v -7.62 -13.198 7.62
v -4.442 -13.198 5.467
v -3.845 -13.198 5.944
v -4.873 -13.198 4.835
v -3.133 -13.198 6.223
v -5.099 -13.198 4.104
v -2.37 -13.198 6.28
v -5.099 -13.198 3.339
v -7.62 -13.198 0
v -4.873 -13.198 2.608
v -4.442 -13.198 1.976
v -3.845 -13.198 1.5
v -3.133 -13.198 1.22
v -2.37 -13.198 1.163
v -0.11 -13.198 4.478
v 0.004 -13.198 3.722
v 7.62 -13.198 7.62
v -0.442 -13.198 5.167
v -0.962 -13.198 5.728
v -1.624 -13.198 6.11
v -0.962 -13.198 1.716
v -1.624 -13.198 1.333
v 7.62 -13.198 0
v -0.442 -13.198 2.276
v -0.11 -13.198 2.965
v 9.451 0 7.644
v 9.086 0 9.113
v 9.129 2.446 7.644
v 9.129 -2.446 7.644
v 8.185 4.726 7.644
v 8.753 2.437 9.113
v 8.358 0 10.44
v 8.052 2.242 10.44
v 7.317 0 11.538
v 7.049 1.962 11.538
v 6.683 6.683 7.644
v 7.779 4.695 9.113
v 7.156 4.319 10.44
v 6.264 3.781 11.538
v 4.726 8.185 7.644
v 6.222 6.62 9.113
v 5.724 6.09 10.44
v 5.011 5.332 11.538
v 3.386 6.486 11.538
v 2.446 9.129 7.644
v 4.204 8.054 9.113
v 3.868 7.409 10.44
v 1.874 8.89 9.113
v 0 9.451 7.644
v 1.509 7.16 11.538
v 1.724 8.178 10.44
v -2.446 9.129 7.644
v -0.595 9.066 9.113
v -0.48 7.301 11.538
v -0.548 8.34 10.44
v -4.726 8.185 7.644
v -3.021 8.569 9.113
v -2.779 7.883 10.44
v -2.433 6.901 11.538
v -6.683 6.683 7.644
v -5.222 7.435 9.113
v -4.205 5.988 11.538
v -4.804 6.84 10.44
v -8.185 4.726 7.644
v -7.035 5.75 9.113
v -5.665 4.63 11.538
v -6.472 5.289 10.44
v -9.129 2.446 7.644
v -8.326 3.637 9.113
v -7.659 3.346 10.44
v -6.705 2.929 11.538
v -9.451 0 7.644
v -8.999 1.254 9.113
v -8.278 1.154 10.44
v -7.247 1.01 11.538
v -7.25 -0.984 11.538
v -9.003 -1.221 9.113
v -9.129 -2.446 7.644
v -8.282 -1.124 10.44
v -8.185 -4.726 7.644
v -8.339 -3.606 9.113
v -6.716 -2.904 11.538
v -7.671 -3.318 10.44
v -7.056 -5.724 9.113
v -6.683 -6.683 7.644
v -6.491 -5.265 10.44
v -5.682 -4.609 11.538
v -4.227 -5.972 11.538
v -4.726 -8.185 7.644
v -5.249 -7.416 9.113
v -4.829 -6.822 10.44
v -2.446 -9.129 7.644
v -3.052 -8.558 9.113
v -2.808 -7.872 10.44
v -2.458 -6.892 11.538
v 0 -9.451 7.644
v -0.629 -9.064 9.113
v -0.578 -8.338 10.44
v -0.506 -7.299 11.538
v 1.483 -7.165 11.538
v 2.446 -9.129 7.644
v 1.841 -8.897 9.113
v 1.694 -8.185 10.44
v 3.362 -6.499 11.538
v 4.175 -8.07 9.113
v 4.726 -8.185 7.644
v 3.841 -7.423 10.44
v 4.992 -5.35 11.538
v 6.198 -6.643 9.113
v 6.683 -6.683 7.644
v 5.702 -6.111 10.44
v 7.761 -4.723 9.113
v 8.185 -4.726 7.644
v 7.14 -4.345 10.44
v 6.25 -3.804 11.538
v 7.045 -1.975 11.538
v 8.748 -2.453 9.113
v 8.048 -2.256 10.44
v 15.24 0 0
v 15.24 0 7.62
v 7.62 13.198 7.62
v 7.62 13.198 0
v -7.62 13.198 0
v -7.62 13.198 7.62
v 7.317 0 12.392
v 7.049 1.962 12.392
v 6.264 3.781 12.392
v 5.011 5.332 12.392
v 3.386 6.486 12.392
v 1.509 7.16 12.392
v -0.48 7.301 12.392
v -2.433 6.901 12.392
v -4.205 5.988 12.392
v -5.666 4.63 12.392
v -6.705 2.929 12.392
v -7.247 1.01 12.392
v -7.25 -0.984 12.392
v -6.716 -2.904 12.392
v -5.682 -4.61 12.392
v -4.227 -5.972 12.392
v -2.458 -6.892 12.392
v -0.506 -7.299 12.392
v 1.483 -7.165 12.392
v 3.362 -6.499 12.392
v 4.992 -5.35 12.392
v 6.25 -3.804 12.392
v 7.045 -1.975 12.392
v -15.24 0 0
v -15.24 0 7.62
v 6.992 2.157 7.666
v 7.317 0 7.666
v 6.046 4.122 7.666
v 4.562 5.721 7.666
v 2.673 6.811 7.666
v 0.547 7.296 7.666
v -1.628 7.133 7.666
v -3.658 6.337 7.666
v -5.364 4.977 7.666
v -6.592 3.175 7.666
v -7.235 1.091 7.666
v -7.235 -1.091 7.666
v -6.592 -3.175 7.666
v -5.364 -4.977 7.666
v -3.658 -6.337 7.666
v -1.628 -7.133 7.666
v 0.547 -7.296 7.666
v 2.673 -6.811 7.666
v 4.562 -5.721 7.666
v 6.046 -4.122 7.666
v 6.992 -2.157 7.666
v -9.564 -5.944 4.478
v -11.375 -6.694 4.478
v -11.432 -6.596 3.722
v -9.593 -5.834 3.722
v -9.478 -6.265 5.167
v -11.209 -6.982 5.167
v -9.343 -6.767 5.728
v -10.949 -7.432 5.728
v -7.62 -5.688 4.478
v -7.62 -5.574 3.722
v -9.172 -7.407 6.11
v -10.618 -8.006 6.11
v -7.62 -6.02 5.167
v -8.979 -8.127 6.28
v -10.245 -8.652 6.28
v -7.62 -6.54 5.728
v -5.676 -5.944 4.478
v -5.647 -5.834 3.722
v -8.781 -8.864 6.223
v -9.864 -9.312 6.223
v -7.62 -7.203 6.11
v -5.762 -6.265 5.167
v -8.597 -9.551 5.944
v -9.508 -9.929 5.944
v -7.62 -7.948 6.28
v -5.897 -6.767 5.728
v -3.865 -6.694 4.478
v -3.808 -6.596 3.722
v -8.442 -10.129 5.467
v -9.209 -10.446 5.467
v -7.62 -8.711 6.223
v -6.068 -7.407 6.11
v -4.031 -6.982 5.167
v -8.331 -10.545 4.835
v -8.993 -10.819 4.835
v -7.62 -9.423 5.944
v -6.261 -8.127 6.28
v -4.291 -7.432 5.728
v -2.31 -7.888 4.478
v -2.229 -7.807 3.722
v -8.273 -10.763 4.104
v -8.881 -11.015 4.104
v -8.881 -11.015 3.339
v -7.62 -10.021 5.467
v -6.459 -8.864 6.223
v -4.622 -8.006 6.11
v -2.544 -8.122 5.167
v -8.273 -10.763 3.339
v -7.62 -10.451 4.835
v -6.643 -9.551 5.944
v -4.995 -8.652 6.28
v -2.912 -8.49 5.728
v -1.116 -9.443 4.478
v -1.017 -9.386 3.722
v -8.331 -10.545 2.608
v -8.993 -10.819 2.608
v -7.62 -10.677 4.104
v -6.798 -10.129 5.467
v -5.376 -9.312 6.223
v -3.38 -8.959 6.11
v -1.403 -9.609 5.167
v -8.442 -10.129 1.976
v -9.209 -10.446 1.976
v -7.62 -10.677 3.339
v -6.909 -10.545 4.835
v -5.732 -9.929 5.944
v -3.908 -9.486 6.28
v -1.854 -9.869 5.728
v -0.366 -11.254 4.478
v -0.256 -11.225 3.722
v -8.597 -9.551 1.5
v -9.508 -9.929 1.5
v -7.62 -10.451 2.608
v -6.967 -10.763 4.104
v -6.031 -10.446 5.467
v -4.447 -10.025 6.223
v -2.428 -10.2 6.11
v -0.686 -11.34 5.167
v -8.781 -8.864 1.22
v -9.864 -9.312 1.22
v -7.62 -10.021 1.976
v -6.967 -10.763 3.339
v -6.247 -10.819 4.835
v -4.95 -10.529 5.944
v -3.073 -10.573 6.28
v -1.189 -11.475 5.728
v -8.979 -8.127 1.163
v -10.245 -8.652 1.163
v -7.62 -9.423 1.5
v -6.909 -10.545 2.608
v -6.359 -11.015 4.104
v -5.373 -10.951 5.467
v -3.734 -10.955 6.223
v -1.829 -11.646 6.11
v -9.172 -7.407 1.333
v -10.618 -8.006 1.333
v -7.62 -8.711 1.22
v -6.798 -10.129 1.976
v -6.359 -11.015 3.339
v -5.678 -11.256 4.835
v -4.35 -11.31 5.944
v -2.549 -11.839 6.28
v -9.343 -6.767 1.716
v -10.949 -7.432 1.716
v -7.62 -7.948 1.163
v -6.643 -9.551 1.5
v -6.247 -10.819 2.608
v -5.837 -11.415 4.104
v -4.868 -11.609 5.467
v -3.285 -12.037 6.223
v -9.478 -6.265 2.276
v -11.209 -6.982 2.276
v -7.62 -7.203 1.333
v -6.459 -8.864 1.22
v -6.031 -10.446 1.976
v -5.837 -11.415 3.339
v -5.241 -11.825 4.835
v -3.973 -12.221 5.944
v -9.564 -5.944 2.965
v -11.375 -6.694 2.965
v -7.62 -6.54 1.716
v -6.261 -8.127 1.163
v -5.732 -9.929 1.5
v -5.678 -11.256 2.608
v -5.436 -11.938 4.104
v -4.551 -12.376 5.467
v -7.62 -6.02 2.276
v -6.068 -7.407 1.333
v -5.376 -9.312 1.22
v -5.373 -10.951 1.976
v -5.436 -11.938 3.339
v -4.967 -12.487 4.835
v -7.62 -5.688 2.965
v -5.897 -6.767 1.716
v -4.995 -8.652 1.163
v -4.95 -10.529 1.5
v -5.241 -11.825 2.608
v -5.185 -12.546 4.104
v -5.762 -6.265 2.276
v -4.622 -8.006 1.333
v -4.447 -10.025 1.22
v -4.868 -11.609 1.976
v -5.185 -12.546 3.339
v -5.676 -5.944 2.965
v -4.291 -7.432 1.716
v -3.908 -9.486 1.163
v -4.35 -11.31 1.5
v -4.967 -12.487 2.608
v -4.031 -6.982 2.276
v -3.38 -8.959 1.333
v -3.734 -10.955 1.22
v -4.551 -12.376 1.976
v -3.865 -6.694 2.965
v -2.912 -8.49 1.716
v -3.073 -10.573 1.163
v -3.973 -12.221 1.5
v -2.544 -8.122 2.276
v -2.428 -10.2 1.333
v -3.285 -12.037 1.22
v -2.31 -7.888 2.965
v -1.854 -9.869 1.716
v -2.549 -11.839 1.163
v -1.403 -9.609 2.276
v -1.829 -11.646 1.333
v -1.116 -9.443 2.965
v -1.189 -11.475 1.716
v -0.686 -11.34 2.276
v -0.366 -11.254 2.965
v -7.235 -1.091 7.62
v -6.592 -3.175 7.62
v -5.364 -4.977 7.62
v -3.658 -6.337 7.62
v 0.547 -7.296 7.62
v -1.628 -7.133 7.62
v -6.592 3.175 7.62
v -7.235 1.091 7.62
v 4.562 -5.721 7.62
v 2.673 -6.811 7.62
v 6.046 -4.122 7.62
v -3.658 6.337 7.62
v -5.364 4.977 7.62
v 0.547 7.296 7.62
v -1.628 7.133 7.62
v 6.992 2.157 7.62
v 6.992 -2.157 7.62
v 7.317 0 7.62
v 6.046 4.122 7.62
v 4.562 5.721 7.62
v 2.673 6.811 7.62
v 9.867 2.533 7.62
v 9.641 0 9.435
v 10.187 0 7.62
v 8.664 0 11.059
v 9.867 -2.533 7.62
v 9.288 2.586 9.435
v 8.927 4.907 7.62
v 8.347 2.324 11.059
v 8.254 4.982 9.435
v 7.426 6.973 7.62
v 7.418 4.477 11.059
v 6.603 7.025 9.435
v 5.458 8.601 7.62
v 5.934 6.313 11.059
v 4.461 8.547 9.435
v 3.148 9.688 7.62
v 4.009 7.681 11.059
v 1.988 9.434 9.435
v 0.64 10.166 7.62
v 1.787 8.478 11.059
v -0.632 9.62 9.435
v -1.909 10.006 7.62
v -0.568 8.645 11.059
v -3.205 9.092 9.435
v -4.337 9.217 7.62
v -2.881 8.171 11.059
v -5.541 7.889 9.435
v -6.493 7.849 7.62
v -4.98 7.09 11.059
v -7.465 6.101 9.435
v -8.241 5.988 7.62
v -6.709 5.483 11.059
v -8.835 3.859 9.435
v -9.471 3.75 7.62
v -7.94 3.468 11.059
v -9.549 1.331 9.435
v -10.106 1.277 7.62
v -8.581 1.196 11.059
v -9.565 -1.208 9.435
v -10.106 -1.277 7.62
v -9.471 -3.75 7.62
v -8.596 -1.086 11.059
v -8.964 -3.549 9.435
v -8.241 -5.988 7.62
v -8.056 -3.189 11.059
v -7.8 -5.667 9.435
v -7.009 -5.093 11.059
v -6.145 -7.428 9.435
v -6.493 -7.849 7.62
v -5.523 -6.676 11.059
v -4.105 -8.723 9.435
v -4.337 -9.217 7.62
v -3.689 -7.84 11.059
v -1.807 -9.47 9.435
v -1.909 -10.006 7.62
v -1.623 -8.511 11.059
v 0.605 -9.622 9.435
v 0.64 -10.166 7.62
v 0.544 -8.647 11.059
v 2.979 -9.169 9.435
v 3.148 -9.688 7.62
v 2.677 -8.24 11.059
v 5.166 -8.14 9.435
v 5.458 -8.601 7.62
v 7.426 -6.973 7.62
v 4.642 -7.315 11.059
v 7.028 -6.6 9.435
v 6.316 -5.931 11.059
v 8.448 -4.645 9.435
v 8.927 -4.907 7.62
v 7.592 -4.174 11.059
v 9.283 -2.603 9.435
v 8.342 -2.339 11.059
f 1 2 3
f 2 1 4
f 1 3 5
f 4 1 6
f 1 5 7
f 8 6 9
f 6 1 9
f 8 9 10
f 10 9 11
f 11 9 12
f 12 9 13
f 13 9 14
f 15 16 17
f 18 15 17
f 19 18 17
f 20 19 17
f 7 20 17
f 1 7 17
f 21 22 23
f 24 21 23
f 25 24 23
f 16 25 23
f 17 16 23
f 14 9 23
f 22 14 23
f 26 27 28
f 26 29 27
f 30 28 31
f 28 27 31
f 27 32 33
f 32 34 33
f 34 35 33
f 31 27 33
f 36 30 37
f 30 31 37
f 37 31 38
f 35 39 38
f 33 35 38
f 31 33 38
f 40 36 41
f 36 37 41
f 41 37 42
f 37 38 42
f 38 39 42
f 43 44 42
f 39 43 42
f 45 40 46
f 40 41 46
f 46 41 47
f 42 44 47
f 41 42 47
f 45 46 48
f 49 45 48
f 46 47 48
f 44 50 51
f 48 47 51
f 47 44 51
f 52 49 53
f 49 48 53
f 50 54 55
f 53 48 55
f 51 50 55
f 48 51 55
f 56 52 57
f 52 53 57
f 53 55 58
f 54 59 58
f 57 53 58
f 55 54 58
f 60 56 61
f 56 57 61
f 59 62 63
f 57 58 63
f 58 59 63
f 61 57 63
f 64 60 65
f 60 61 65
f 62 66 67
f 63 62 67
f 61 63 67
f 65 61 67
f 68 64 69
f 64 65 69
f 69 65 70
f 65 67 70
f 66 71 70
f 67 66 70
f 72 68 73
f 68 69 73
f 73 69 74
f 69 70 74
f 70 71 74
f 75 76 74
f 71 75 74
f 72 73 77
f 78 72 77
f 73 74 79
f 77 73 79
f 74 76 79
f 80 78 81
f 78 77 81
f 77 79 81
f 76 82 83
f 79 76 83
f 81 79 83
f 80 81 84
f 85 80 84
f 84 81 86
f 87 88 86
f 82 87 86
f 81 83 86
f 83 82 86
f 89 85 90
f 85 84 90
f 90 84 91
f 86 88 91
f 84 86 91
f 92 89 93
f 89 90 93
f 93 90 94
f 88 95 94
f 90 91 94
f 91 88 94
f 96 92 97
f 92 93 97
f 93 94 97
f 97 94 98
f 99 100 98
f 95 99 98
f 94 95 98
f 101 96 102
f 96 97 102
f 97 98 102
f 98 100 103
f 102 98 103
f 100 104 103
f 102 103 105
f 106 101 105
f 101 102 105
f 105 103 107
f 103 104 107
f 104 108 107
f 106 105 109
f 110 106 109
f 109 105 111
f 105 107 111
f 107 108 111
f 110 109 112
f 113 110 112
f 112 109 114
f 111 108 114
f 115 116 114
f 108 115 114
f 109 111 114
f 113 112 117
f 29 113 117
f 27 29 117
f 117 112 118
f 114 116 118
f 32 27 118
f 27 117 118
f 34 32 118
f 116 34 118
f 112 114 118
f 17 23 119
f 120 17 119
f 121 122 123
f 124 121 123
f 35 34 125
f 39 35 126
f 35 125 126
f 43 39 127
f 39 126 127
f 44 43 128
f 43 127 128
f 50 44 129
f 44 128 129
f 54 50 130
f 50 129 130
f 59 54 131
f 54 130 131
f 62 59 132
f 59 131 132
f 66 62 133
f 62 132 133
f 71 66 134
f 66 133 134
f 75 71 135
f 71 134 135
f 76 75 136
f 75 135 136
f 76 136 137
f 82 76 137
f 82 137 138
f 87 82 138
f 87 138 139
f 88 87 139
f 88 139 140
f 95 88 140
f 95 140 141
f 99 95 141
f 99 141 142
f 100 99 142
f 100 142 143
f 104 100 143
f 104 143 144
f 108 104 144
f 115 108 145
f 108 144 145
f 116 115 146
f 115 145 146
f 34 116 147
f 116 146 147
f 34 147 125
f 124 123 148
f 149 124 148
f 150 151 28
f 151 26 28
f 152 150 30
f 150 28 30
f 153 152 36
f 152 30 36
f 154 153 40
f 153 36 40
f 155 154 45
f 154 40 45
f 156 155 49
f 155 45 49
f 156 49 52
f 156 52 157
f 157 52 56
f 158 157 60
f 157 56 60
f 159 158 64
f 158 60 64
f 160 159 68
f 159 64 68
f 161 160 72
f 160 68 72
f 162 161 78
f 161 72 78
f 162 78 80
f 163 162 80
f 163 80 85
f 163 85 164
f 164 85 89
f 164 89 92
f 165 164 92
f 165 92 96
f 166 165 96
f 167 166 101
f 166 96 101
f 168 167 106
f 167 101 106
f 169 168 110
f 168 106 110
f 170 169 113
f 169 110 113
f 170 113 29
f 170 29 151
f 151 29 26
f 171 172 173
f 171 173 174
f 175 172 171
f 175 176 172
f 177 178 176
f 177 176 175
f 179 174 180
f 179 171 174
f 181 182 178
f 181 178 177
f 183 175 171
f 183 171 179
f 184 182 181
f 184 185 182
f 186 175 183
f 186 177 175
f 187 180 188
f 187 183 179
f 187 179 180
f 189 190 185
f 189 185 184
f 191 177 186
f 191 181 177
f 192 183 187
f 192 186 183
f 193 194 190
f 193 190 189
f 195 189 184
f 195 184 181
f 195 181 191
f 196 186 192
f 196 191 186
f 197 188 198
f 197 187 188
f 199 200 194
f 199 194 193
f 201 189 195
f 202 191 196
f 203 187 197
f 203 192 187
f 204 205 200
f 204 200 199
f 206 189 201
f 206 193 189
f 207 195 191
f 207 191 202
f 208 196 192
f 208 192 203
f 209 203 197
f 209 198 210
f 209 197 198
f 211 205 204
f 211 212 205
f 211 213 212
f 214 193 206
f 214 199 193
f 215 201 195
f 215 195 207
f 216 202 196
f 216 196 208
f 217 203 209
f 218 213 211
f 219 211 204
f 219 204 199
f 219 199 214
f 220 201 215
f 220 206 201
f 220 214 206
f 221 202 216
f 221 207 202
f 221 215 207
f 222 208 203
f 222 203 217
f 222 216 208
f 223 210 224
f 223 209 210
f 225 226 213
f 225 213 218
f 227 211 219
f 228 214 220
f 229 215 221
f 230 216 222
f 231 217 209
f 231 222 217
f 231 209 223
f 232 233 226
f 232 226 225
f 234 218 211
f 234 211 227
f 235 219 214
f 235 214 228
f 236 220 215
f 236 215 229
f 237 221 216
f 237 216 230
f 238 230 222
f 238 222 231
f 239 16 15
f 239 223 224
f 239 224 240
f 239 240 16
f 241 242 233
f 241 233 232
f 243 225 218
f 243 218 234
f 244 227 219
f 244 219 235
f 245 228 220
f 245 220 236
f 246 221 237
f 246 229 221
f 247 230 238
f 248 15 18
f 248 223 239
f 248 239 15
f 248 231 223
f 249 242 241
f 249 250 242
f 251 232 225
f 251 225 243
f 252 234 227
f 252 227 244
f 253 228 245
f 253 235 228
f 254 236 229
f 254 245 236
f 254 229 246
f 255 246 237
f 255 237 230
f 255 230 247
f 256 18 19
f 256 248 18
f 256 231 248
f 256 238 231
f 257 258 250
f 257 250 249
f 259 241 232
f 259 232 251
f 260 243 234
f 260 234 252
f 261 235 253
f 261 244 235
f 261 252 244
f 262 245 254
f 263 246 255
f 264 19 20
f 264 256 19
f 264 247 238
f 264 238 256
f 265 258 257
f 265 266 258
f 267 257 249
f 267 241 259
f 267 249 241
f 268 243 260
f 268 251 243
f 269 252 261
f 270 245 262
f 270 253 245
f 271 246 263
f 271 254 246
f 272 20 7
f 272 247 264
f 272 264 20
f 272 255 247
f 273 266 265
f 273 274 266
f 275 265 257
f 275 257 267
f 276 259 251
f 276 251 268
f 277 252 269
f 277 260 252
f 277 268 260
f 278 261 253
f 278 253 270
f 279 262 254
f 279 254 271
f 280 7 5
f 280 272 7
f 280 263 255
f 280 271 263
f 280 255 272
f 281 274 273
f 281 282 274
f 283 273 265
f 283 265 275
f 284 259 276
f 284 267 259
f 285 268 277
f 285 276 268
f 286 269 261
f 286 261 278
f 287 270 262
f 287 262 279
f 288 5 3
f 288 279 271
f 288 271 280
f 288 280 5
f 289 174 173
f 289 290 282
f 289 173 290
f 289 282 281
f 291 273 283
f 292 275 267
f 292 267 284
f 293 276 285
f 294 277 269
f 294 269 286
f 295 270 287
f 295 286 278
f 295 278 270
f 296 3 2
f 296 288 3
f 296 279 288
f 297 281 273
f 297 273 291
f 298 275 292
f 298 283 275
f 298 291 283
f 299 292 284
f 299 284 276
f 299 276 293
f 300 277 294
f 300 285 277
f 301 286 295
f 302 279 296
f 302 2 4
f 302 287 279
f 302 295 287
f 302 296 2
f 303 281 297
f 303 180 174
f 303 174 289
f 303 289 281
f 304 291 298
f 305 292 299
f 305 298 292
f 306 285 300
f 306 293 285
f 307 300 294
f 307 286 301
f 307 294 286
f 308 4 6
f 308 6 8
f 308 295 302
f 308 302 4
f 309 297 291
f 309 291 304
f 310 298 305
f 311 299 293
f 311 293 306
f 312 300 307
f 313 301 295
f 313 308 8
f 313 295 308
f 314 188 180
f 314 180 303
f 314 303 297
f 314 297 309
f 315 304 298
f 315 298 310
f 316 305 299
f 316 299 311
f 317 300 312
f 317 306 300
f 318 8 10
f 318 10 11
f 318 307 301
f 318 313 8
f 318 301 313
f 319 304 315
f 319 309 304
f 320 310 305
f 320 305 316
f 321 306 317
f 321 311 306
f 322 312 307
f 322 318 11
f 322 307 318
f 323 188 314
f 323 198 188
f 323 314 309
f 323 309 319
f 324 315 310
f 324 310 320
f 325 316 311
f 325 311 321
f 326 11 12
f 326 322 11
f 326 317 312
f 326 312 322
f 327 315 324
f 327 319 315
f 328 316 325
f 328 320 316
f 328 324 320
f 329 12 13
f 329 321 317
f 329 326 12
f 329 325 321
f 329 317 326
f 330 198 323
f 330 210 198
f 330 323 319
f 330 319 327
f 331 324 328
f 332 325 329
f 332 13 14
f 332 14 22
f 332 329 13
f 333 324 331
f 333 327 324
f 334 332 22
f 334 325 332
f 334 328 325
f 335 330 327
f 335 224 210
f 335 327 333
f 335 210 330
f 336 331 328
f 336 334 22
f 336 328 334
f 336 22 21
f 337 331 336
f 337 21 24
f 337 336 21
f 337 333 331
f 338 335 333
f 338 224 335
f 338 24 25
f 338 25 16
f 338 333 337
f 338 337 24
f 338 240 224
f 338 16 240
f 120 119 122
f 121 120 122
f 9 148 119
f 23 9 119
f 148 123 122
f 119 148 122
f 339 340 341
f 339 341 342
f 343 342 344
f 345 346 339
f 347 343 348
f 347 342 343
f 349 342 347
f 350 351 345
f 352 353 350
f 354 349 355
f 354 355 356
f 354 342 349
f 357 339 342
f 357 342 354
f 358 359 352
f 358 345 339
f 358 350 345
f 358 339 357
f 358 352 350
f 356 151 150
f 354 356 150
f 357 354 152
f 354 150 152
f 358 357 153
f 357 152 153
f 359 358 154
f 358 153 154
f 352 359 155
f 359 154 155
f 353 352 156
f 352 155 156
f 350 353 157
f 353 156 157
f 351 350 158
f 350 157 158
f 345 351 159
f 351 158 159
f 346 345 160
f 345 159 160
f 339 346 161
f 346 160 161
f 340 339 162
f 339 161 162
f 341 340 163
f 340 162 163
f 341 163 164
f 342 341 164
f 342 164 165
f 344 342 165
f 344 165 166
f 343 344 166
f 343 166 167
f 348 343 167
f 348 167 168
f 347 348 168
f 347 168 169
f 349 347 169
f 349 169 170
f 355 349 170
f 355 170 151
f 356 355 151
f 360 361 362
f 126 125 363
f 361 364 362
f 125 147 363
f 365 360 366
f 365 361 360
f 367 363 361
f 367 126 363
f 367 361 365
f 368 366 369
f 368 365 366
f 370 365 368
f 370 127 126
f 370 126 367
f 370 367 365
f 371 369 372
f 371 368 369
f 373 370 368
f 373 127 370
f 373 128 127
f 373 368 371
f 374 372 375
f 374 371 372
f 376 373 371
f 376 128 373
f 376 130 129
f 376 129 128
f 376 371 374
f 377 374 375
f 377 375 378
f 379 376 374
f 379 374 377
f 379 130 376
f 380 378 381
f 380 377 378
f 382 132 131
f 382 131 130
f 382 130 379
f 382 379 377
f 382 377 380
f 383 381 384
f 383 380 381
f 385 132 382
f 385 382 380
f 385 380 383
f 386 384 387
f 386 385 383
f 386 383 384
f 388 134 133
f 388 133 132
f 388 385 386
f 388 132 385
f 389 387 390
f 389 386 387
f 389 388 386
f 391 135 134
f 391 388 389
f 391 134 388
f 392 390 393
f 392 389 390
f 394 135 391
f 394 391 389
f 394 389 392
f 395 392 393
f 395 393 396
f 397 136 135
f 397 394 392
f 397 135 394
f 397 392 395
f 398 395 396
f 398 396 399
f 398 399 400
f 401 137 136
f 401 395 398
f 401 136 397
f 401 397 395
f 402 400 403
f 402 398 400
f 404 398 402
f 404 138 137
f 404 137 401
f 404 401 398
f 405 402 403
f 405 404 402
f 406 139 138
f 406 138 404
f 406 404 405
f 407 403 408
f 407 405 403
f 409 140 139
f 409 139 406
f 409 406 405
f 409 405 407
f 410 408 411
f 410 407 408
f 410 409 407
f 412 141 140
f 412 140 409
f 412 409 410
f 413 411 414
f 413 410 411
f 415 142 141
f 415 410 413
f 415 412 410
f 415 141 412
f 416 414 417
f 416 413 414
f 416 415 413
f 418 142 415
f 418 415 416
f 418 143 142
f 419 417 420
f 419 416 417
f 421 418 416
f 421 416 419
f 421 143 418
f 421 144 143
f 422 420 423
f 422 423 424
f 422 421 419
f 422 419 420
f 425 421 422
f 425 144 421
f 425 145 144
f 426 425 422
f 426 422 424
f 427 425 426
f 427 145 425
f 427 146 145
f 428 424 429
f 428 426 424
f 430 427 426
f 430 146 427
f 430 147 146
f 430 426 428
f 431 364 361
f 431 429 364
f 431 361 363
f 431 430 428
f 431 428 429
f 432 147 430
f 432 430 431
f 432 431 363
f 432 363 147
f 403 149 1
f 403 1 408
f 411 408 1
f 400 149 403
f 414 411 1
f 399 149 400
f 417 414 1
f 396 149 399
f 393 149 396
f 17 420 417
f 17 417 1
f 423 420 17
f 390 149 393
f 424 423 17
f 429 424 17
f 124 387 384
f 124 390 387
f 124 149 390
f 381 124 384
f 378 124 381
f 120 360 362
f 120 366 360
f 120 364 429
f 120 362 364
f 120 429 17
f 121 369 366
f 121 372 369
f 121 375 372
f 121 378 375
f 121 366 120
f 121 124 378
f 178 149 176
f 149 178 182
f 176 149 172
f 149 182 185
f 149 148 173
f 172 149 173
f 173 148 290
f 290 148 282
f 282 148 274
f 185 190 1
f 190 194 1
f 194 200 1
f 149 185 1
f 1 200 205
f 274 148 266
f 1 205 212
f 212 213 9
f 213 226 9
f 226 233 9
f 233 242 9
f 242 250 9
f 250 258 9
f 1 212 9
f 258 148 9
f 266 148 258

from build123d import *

# Parameters (mm, degrees)
F1_DEPTH = 7.62
F2_R     = 10.1865714181
F3_DEPTH = 6.35
F5_R     = 7.316904296
F6_DEPTH = 6.35
F9_R     = 2.5656803157


# Not quite as in the source:
# - a fillet or chamfer that OpenCascade refuses, or shapes differently, is made with other operations: its cross-section is extruded or revolved along the edge and cut away or added


with BuildPart() as f1:
    # F0 (on Top) → F1 (new body)
    with BuildSketch(Plane.XY):
        Polygon((7.62, -13.1982271537), (15.24, 0), (7.62, 13.1982271537), (-7.62, 13.1982271537), (-15.24, 0), (-7.62, -13.1982271537), align=None)
    extrude(amount=F1_DEPTH)

    # F2 (on face) → F3 (join)
    with BuildSketch(Plane.XY.offset(7.62)):
        Circle(F2_R)
    extrude(amount=F3_DEPTH)

    # F4: fillet of radius 7.62 on 1 edges, made by hand

    # F4_s1 → F4_t2 (revolve, cut)
    with BuildSketch(Plane.XZ):
        with BuildLine():
            ThreePointArc((10.1865714181, 7.62), (7.5918389432, 12.1698711326), (2.6731500935, 13.97))
            Line((2.6731500935, 13.97), (10.1865714181, 13.97))
            Line((10.1865714181, 13.97), (10.1865714181, 7.62))
        make_face()
    revolve(axis=Axis((0, 0, 13.97), (0, 0, 1)), mode=Mode.SUBTRACT)

    # F5 (on face) → F6 (cut, through all)
    with BuildSketch(Plane.XY.offset(13.97)):
        Circle(F5_R)
    extrude(amount=-F6_DEPTH, mode=Mode.SUBTRACT)

    # F7 (on Front) → F8 (revolve, cut)
    with BuildSketch(Plane.XZ):
        with BuildLine():
            Line((7.2382027283, 7.666405756), (9.4514777884, 7.6440493576))
            ThreePointArc((9.4514777884, 7.6440493576), (8.7401460246, 9.8436861794), (7.2382027283, 11.6011165082))
            Line((7.2382027283, 11.6011165082), (7.2382027283, 7.666405756))
        make_face()
    revolve(axis=Axis((0, 0, 13.97), (0, 0, 1)), mode=Mode.SUBTRACT)

    # F9 (on face) → F10 (revolve, cut)
    with BuildSketch(Plane.XZ.offset(13.1982271537)):
        with Locations((-2.5616665371, 3.7216017954)):
            Circle(F9_R)
    revolve(axis=Axis((-7.62, -13.1982271537, 3.81), (0, 0, -1)), mode=Mode.SUBTRACT)


solid = f1.part
